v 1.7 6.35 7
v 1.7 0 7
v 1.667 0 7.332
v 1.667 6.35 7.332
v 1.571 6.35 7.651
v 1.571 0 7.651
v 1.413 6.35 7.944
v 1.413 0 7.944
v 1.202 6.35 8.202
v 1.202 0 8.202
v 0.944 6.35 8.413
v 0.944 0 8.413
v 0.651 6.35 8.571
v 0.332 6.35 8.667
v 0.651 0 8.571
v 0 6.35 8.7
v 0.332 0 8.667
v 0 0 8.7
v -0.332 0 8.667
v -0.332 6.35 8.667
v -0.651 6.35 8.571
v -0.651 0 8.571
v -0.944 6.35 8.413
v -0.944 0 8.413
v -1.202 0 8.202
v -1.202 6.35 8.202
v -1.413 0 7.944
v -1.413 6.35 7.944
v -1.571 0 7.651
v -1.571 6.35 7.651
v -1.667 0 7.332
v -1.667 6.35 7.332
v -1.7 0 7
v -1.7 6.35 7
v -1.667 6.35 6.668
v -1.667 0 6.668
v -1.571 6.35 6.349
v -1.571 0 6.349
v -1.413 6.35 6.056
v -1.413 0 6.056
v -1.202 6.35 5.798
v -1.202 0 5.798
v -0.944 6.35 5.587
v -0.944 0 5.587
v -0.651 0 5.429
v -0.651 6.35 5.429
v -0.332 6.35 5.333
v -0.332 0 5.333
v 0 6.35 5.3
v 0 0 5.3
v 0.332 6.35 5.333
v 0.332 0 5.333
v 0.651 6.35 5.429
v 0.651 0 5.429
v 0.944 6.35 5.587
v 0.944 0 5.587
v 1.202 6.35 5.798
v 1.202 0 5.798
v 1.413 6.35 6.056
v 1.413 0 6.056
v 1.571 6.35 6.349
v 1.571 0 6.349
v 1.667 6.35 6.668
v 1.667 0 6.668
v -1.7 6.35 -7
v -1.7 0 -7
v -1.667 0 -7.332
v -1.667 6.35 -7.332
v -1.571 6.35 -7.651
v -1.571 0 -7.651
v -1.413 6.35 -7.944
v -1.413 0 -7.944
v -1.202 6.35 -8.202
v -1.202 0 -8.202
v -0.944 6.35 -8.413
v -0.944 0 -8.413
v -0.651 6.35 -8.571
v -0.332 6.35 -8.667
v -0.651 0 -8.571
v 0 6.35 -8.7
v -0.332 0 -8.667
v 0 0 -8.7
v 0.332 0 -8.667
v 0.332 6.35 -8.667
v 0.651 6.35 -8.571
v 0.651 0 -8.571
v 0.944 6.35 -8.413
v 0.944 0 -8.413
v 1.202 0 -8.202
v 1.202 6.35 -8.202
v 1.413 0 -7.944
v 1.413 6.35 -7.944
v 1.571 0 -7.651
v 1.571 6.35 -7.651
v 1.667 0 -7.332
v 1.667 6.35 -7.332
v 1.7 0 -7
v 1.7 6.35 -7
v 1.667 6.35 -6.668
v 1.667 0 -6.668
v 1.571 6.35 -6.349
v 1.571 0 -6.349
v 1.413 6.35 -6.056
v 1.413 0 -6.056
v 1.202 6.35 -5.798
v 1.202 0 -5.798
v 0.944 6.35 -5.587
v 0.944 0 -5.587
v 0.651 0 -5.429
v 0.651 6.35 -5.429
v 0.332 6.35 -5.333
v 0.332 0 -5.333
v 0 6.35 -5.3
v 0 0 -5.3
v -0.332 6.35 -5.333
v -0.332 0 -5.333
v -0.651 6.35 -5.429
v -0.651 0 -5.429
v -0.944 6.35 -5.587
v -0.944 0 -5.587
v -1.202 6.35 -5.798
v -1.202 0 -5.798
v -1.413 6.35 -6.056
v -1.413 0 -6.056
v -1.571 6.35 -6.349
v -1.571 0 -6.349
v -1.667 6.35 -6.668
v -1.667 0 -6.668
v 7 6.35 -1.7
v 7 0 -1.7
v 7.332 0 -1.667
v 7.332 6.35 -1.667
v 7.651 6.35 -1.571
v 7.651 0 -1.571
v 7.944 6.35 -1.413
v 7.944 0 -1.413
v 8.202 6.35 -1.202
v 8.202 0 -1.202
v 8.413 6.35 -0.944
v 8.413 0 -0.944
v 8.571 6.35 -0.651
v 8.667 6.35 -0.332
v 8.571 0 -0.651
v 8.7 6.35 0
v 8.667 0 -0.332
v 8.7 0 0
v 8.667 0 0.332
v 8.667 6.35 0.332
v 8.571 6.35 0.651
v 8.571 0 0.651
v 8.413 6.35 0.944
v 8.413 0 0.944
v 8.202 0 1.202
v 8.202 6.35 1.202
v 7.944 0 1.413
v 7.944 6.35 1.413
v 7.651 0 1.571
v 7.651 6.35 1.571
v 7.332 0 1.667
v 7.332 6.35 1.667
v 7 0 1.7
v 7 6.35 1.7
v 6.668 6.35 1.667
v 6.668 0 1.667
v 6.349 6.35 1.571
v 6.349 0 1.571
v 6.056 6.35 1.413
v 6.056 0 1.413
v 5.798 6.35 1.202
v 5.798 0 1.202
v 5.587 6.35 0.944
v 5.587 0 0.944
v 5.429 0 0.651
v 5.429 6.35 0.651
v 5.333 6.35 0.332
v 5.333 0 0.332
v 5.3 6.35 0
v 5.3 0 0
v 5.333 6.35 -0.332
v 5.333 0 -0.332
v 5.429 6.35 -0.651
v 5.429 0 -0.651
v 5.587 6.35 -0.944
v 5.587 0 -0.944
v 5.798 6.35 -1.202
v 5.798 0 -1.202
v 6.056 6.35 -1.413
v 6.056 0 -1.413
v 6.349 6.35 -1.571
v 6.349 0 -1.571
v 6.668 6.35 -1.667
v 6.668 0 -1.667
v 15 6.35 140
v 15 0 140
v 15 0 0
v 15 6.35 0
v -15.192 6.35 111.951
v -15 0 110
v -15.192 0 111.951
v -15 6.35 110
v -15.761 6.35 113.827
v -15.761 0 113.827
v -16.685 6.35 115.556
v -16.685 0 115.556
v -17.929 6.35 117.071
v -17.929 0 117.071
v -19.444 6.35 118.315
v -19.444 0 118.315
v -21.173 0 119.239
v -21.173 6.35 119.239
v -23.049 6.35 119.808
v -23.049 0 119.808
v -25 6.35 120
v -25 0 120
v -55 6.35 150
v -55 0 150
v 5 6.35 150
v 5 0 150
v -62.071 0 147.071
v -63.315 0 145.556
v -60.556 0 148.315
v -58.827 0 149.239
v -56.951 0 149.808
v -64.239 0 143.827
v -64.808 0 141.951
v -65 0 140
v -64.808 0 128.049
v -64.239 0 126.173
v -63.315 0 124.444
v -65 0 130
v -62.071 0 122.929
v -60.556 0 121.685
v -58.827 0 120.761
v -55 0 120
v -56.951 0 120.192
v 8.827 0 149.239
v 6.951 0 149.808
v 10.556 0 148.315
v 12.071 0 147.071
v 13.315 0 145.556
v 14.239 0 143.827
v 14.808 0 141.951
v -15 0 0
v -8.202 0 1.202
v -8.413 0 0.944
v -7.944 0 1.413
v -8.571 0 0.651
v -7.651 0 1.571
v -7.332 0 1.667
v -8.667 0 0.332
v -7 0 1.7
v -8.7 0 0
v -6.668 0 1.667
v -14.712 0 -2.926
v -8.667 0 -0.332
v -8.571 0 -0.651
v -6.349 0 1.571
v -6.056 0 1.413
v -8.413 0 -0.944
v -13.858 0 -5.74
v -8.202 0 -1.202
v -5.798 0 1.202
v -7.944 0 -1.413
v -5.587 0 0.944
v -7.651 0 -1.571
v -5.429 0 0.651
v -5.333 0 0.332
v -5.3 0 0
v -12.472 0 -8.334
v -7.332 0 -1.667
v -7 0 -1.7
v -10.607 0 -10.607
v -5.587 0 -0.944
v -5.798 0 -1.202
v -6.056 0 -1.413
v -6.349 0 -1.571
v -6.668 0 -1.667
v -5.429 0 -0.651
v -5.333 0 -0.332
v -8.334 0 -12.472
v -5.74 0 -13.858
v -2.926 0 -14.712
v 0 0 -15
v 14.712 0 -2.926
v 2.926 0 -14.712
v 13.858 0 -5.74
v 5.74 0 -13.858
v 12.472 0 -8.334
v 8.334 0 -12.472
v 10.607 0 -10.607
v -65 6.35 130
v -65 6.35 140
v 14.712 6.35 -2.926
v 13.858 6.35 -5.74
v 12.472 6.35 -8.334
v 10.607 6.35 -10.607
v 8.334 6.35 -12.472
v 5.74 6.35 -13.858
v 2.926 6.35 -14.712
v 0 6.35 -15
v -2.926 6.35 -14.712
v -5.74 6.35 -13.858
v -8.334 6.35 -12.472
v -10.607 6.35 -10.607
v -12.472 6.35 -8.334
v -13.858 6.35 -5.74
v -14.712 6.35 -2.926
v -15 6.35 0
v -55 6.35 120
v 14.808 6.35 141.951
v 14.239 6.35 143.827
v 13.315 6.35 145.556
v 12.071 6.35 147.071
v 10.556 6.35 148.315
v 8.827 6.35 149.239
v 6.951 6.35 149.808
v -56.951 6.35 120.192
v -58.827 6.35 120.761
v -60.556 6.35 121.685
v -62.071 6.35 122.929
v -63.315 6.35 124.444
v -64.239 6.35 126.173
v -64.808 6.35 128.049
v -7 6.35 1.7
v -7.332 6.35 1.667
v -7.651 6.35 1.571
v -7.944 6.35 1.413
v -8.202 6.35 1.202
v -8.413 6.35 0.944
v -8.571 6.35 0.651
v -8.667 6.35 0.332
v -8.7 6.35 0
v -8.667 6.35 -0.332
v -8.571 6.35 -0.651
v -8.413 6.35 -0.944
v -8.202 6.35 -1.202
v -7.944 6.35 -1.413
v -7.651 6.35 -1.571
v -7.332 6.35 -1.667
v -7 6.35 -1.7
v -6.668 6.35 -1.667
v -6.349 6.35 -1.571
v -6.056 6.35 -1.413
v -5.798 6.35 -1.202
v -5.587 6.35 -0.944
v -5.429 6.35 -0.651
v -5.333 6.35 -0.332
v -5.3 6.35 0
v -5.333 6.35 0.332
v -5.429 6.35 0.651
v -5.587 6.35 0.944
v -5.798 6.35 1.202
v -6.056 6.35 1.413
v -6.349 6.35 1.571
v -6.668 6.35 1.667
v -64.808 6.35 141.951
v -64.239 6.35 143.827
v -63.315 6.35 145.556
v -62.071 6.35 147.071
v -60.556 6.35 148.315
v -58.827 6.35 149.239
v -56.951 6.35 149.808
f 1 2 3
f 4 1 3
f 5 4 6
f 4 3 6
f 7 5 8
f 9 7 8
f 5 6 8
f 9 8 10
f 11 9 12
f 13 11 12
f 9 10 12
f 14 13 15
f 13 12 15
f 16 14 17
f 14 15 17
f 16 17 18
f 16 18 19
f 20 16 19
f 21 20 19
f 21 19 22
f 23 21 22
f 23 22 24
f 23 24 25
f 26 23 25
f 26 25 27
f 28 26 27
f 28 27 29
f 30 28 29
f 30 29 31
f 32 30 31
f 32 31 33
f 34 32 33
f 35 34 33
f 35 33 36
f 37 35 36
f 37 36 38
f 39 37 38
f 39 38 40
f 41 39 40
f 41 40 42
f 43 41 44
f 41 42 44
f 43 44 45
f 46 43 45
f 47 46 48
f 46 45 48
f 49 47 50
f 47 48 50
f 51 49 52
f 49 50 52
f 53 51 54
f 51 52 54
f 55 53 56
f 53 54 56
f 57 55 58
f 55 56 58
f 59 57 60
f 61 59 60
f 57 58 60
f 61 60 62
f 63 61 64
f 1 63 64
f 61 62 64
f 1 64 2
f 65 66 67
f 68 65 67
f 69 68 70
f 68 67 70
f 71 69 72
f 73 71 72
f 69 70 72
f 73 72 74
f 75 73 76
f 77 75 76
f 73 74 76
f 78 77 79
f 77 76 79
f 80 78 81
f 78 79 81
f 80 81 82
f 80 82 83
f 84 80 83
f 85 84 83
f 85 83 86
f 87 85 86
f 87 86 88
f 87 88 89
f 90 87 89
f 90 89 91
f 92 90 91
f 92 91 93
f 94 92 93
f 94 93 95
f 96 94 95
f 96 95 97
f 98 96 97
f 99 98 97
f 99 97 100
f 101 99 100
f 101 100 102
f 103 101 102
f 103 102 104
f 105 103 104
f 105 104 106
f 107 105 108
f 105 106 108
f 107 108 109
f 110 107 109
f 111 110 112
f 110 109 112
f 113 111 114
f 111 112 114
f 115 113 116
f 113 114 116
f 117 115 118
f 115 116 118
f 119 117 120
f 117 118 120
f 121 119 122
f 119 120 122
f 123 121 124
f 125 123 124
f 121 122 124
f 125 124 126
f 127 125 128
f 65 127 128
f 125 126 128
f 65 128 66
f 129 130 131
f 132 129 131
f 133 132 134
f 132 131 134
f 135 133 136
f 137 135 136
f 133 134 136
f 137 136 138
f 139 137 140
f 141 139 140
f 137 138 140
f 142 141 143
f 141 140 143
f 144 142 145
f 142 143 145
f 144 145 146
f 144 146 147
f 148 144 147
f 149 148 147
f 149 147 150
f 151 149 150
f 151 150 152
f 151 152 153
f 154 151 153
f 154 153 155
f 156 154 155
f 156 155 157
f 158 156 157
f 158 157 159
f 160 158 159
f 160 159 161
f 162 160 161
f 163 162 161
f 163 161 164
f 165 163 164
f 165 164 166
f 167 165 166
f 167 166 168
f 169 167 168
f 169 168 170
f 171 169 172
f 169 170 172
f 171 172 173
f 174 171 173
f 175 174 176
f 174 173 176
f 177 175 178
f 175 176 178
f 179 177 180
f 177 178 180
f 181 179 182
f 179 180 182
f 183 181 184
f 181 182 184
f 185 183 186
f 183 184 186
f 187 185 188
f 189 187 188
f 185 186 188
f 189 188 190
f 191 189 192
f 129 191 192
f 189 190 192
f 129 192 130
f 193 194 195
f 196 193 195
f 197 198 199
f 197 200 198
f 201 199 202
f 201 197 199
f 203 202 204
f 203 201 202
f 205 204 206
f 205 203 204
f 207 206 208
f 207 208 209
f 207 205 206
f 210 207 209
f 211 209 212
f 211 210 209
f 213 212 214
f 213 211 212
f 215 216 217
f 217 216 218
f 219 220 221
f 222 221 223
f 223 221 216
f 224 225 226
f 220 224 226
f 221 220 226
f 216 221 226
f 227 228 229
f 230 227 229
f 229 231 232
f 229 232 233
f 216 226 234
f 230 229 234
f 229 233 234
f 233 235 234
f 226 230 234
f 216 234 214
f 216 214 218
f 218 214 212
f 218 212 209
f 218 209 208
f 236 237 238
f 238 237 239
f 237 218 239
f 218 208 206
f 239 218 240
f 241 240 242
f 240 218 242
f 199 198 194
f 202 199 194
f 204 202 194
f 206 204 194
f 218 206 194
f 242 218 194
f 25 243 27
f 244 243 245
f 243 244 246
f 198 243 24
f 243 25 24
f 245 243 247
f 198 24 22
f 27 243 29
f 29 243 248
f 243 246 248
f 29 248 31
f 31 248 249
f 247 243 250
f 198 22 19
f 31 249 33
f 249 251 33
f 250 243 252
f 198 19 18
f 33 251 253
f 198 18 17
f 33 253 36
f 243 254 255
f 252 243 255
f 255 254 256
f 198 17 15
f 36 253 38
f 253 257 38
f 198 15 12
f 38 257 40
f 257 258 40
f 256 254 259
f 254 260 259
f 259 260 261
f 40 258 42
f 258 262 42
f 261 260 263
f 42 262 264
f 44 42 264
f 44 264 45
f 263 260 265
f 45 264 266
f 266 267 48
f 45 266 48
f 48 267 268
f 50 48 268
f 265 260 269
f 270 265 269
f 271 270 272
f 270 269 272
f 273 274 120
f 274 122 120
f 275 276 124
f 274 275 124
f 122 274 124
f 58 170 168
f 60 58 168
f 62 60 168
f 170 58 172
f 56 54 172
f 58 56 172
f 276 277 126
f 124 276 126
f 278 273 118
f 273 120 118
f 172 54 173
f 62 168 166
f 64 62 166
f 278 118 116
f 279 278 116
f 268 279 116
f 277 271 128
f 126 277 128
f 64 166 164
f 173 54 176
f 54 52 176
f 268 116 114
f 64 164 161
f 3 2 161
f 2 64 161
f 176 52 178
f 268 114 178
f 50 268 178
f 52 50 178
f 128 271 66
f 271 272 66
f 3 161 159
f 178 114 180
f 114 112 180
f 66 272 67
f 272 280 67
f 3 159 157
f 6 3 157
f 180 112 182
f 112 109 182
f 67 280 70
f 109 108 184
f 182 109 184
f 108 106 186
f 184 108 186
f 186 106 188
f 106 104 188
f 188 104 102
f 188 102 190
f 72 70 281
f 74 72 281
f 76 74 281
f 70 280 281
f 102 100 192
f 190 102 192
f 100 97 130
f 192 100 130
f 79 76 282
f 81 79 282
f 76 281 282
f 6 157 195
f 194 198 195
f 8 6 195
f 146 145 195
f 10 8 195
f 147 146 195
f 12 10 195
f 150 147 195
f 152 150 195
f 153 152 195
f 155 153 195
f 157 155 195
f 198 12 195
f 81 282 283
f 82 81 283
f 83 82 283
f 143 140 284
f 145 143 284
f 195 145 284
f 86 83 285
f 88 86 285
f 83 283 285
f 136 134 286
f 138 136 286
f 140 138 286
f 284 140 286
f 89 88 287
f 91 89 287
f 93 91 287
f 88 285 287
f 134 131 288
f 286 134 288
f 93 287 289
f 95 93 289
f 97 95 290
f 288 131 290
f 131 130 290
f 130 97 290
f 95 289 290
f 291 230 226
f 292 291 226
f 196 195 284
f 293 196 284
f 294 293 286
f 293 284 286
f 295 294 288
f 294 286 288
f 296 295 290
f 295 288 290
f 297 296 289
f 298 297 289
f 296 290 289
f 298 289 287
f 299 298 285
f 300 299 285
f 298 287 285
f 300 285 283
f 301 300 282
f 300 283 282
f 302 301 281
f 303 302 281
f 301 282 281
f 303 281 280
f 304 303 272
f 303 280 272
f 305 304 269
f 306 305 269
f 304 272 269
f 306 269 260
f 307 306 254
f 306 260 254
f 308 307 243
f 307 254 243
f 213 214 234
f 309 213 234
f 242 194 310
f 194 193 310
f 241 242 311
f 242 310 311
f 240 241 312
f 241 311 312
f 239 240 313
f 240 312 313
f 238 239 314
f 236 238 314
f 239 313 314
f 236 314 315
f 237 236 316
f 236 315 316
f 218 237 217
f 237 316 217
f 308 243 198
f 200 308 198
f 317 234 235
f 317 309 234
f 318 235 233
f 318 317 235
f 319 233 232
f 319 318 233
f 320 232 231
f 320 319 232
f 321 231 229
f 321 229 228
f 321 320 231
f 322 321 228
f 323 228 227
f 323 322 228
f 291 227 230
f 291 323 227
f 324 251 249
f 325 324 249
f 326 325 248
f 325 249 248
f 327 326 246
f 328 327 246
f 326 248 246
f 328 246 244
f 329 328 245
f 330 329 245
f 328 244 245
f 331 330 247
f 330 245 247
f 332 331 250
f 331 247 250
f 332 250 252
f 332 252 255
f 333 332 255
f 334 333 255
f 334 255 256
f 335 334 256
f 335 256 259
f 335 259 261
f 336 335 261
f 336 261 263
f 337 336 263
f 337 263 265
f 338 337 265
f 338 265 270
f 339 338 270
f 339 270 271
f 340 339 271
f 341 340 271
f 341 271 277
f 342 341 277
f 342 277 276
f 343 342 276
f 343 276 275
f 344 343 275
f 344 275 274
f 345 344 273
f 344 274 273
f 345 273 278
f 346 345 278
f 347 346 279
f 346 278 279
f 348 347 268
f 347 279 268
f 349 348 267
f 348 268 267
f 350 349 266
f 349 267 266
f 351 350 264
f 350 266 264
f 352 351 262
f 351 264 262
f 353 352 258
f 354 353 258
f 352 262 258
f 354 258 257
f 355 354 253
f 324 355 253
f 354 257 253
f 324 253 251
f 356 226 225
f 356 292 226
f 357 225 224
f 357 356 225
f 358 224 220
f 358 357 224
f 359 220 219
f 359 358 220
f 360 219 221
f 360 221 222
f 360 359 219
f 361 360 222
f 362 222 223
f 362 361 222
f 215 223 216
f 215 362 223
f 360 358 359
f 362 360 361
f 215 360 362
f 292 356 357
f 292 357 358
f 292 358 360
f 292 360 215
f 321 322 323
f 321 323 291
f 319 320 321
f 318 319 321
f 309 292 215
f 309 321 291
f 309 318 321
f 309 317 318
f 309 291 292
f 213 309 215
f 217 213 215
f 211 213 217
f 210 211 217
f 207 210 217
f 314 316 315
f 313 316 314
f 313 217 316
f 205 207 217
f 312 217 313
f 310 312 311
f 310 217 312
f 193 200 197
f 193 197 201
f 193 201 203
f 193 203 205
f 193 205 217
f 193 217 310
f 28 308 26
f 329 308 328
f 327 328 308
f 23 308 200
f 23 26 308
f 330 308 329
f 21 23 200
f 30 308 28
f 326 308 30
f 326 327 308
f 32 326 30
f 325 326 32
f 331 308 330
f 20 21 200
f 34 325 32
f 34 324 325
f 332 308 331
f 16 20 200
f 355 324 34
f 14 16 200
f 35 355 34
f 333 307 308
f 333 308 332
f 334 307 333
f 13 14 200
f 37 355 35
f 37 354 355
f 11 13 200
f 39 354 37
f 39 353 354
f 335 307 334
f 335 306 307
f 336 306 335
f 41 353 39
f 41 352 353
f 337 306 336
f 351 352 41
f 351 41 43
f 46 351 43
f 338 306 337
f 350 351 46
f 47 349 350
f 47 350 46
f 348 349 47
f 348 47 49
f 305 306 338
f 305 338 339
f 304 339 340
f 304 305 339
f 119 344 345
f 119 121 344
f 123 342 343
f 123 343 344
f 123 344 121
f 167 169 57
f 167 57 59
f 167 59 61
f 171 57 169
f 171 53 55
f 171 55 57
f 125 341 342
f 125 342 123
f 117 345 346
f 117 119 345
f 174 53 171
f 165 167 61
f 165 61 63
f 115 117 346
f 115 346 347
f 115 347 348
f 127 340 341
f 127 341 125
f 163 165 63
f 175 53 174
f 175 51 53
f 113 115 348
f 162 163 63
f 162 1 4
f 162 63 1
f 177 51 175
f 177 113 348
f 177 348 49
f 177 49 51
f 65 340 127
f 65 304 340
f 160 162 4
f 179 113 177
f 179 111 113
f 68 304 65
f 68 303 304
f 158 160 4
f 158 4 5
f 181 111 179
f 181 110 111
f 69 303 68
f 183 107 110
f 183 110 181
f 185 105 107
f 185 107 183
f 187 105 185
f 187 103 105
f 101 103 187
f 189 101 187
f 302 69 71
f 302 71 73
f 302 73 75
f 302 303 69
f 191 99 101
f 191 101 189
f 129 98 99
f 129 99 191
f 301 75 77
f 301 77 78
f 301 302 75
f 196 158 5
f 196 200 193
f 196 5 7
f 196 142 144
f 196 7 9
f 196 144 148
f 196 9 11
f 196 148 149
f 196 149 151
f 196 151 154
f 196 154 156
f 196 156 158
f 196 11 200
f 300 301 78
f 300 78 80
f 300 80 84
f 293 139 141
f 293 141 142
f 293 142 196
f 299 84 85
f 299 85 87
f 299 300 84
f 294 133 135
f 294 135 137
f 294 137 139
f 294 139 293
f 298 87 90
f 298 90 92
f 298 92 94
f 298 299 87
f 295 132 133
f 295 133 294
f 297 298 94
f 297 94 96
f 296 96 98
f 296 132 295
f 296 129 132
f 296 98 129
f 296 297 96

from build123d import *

# Parameters (mm, degrees)
SKETCH2_R            = 15
BOSS_EXTRUDE1_DEPTH  = 6.35
M3_CLEARANCE_HOLE1_D = 3.4
CIRPATTERN1_COUNT    = 4
FILLET1_R            = 10


with BuildPart() as part:
    # Sketch2 → Boss-Extrude1 (new body)
    with BuildSketch(Plane(origin=(0, 0, 0), x_dir=(1, 0, 0), z_dir=(0, 1, 0))):
        with BuildLine():
            ThreePointArc((15, 0), (0, -15), (-15, 0))
            Line((-15, 0), (-15, -120))
            Line((-15, -120), (-65, -120))
            Line((-65, -120), (-65, -150))
            Line((-65, -150), (15, -150))
            Line((15, -150), (15, 0))
        make_face()
        Circle(SKETCH2_R)
    extrude(amount=BOSS_EXTRUDE1_DEPTH)

    # M3 Clearance Hole1 (through all)
    with Locations(Plane(origin=(0, 6.35, 0), x_dir=(1, 0, 0), z_dir=(0, 1, 0))):
        with Locations((0, 7)):
            m3_clearance_hole1 = Hole(M3_CLEARANCE_HOLE1_D / 2)

    # CirPattern1: M3 Clearance Hole1 ×4 about axis
    cirpattern1_axis = Axis((0, 0, 0), (0, 1, 0))
    for i in range(1, CIRPATTERN1_COUNT):
        add(m3_clearance_hole1.rotate(cirpattern1_axis, i * 360 / CIRPATTERN1_COUNT), mode=Mode.SUBTRACT)

    # Fillet1
    fillet1_edges = [part.edges().sort_by_distance(p)[0] for p in [
        (15, 3.175, 150),
        (-65, 3.175, 150),
        (-65, 3.175, 120),
        (-15, 3.175, 120),
    ]]
    fillet(fillet1_edges, radius=FILLET1_R)


solid = part.part
